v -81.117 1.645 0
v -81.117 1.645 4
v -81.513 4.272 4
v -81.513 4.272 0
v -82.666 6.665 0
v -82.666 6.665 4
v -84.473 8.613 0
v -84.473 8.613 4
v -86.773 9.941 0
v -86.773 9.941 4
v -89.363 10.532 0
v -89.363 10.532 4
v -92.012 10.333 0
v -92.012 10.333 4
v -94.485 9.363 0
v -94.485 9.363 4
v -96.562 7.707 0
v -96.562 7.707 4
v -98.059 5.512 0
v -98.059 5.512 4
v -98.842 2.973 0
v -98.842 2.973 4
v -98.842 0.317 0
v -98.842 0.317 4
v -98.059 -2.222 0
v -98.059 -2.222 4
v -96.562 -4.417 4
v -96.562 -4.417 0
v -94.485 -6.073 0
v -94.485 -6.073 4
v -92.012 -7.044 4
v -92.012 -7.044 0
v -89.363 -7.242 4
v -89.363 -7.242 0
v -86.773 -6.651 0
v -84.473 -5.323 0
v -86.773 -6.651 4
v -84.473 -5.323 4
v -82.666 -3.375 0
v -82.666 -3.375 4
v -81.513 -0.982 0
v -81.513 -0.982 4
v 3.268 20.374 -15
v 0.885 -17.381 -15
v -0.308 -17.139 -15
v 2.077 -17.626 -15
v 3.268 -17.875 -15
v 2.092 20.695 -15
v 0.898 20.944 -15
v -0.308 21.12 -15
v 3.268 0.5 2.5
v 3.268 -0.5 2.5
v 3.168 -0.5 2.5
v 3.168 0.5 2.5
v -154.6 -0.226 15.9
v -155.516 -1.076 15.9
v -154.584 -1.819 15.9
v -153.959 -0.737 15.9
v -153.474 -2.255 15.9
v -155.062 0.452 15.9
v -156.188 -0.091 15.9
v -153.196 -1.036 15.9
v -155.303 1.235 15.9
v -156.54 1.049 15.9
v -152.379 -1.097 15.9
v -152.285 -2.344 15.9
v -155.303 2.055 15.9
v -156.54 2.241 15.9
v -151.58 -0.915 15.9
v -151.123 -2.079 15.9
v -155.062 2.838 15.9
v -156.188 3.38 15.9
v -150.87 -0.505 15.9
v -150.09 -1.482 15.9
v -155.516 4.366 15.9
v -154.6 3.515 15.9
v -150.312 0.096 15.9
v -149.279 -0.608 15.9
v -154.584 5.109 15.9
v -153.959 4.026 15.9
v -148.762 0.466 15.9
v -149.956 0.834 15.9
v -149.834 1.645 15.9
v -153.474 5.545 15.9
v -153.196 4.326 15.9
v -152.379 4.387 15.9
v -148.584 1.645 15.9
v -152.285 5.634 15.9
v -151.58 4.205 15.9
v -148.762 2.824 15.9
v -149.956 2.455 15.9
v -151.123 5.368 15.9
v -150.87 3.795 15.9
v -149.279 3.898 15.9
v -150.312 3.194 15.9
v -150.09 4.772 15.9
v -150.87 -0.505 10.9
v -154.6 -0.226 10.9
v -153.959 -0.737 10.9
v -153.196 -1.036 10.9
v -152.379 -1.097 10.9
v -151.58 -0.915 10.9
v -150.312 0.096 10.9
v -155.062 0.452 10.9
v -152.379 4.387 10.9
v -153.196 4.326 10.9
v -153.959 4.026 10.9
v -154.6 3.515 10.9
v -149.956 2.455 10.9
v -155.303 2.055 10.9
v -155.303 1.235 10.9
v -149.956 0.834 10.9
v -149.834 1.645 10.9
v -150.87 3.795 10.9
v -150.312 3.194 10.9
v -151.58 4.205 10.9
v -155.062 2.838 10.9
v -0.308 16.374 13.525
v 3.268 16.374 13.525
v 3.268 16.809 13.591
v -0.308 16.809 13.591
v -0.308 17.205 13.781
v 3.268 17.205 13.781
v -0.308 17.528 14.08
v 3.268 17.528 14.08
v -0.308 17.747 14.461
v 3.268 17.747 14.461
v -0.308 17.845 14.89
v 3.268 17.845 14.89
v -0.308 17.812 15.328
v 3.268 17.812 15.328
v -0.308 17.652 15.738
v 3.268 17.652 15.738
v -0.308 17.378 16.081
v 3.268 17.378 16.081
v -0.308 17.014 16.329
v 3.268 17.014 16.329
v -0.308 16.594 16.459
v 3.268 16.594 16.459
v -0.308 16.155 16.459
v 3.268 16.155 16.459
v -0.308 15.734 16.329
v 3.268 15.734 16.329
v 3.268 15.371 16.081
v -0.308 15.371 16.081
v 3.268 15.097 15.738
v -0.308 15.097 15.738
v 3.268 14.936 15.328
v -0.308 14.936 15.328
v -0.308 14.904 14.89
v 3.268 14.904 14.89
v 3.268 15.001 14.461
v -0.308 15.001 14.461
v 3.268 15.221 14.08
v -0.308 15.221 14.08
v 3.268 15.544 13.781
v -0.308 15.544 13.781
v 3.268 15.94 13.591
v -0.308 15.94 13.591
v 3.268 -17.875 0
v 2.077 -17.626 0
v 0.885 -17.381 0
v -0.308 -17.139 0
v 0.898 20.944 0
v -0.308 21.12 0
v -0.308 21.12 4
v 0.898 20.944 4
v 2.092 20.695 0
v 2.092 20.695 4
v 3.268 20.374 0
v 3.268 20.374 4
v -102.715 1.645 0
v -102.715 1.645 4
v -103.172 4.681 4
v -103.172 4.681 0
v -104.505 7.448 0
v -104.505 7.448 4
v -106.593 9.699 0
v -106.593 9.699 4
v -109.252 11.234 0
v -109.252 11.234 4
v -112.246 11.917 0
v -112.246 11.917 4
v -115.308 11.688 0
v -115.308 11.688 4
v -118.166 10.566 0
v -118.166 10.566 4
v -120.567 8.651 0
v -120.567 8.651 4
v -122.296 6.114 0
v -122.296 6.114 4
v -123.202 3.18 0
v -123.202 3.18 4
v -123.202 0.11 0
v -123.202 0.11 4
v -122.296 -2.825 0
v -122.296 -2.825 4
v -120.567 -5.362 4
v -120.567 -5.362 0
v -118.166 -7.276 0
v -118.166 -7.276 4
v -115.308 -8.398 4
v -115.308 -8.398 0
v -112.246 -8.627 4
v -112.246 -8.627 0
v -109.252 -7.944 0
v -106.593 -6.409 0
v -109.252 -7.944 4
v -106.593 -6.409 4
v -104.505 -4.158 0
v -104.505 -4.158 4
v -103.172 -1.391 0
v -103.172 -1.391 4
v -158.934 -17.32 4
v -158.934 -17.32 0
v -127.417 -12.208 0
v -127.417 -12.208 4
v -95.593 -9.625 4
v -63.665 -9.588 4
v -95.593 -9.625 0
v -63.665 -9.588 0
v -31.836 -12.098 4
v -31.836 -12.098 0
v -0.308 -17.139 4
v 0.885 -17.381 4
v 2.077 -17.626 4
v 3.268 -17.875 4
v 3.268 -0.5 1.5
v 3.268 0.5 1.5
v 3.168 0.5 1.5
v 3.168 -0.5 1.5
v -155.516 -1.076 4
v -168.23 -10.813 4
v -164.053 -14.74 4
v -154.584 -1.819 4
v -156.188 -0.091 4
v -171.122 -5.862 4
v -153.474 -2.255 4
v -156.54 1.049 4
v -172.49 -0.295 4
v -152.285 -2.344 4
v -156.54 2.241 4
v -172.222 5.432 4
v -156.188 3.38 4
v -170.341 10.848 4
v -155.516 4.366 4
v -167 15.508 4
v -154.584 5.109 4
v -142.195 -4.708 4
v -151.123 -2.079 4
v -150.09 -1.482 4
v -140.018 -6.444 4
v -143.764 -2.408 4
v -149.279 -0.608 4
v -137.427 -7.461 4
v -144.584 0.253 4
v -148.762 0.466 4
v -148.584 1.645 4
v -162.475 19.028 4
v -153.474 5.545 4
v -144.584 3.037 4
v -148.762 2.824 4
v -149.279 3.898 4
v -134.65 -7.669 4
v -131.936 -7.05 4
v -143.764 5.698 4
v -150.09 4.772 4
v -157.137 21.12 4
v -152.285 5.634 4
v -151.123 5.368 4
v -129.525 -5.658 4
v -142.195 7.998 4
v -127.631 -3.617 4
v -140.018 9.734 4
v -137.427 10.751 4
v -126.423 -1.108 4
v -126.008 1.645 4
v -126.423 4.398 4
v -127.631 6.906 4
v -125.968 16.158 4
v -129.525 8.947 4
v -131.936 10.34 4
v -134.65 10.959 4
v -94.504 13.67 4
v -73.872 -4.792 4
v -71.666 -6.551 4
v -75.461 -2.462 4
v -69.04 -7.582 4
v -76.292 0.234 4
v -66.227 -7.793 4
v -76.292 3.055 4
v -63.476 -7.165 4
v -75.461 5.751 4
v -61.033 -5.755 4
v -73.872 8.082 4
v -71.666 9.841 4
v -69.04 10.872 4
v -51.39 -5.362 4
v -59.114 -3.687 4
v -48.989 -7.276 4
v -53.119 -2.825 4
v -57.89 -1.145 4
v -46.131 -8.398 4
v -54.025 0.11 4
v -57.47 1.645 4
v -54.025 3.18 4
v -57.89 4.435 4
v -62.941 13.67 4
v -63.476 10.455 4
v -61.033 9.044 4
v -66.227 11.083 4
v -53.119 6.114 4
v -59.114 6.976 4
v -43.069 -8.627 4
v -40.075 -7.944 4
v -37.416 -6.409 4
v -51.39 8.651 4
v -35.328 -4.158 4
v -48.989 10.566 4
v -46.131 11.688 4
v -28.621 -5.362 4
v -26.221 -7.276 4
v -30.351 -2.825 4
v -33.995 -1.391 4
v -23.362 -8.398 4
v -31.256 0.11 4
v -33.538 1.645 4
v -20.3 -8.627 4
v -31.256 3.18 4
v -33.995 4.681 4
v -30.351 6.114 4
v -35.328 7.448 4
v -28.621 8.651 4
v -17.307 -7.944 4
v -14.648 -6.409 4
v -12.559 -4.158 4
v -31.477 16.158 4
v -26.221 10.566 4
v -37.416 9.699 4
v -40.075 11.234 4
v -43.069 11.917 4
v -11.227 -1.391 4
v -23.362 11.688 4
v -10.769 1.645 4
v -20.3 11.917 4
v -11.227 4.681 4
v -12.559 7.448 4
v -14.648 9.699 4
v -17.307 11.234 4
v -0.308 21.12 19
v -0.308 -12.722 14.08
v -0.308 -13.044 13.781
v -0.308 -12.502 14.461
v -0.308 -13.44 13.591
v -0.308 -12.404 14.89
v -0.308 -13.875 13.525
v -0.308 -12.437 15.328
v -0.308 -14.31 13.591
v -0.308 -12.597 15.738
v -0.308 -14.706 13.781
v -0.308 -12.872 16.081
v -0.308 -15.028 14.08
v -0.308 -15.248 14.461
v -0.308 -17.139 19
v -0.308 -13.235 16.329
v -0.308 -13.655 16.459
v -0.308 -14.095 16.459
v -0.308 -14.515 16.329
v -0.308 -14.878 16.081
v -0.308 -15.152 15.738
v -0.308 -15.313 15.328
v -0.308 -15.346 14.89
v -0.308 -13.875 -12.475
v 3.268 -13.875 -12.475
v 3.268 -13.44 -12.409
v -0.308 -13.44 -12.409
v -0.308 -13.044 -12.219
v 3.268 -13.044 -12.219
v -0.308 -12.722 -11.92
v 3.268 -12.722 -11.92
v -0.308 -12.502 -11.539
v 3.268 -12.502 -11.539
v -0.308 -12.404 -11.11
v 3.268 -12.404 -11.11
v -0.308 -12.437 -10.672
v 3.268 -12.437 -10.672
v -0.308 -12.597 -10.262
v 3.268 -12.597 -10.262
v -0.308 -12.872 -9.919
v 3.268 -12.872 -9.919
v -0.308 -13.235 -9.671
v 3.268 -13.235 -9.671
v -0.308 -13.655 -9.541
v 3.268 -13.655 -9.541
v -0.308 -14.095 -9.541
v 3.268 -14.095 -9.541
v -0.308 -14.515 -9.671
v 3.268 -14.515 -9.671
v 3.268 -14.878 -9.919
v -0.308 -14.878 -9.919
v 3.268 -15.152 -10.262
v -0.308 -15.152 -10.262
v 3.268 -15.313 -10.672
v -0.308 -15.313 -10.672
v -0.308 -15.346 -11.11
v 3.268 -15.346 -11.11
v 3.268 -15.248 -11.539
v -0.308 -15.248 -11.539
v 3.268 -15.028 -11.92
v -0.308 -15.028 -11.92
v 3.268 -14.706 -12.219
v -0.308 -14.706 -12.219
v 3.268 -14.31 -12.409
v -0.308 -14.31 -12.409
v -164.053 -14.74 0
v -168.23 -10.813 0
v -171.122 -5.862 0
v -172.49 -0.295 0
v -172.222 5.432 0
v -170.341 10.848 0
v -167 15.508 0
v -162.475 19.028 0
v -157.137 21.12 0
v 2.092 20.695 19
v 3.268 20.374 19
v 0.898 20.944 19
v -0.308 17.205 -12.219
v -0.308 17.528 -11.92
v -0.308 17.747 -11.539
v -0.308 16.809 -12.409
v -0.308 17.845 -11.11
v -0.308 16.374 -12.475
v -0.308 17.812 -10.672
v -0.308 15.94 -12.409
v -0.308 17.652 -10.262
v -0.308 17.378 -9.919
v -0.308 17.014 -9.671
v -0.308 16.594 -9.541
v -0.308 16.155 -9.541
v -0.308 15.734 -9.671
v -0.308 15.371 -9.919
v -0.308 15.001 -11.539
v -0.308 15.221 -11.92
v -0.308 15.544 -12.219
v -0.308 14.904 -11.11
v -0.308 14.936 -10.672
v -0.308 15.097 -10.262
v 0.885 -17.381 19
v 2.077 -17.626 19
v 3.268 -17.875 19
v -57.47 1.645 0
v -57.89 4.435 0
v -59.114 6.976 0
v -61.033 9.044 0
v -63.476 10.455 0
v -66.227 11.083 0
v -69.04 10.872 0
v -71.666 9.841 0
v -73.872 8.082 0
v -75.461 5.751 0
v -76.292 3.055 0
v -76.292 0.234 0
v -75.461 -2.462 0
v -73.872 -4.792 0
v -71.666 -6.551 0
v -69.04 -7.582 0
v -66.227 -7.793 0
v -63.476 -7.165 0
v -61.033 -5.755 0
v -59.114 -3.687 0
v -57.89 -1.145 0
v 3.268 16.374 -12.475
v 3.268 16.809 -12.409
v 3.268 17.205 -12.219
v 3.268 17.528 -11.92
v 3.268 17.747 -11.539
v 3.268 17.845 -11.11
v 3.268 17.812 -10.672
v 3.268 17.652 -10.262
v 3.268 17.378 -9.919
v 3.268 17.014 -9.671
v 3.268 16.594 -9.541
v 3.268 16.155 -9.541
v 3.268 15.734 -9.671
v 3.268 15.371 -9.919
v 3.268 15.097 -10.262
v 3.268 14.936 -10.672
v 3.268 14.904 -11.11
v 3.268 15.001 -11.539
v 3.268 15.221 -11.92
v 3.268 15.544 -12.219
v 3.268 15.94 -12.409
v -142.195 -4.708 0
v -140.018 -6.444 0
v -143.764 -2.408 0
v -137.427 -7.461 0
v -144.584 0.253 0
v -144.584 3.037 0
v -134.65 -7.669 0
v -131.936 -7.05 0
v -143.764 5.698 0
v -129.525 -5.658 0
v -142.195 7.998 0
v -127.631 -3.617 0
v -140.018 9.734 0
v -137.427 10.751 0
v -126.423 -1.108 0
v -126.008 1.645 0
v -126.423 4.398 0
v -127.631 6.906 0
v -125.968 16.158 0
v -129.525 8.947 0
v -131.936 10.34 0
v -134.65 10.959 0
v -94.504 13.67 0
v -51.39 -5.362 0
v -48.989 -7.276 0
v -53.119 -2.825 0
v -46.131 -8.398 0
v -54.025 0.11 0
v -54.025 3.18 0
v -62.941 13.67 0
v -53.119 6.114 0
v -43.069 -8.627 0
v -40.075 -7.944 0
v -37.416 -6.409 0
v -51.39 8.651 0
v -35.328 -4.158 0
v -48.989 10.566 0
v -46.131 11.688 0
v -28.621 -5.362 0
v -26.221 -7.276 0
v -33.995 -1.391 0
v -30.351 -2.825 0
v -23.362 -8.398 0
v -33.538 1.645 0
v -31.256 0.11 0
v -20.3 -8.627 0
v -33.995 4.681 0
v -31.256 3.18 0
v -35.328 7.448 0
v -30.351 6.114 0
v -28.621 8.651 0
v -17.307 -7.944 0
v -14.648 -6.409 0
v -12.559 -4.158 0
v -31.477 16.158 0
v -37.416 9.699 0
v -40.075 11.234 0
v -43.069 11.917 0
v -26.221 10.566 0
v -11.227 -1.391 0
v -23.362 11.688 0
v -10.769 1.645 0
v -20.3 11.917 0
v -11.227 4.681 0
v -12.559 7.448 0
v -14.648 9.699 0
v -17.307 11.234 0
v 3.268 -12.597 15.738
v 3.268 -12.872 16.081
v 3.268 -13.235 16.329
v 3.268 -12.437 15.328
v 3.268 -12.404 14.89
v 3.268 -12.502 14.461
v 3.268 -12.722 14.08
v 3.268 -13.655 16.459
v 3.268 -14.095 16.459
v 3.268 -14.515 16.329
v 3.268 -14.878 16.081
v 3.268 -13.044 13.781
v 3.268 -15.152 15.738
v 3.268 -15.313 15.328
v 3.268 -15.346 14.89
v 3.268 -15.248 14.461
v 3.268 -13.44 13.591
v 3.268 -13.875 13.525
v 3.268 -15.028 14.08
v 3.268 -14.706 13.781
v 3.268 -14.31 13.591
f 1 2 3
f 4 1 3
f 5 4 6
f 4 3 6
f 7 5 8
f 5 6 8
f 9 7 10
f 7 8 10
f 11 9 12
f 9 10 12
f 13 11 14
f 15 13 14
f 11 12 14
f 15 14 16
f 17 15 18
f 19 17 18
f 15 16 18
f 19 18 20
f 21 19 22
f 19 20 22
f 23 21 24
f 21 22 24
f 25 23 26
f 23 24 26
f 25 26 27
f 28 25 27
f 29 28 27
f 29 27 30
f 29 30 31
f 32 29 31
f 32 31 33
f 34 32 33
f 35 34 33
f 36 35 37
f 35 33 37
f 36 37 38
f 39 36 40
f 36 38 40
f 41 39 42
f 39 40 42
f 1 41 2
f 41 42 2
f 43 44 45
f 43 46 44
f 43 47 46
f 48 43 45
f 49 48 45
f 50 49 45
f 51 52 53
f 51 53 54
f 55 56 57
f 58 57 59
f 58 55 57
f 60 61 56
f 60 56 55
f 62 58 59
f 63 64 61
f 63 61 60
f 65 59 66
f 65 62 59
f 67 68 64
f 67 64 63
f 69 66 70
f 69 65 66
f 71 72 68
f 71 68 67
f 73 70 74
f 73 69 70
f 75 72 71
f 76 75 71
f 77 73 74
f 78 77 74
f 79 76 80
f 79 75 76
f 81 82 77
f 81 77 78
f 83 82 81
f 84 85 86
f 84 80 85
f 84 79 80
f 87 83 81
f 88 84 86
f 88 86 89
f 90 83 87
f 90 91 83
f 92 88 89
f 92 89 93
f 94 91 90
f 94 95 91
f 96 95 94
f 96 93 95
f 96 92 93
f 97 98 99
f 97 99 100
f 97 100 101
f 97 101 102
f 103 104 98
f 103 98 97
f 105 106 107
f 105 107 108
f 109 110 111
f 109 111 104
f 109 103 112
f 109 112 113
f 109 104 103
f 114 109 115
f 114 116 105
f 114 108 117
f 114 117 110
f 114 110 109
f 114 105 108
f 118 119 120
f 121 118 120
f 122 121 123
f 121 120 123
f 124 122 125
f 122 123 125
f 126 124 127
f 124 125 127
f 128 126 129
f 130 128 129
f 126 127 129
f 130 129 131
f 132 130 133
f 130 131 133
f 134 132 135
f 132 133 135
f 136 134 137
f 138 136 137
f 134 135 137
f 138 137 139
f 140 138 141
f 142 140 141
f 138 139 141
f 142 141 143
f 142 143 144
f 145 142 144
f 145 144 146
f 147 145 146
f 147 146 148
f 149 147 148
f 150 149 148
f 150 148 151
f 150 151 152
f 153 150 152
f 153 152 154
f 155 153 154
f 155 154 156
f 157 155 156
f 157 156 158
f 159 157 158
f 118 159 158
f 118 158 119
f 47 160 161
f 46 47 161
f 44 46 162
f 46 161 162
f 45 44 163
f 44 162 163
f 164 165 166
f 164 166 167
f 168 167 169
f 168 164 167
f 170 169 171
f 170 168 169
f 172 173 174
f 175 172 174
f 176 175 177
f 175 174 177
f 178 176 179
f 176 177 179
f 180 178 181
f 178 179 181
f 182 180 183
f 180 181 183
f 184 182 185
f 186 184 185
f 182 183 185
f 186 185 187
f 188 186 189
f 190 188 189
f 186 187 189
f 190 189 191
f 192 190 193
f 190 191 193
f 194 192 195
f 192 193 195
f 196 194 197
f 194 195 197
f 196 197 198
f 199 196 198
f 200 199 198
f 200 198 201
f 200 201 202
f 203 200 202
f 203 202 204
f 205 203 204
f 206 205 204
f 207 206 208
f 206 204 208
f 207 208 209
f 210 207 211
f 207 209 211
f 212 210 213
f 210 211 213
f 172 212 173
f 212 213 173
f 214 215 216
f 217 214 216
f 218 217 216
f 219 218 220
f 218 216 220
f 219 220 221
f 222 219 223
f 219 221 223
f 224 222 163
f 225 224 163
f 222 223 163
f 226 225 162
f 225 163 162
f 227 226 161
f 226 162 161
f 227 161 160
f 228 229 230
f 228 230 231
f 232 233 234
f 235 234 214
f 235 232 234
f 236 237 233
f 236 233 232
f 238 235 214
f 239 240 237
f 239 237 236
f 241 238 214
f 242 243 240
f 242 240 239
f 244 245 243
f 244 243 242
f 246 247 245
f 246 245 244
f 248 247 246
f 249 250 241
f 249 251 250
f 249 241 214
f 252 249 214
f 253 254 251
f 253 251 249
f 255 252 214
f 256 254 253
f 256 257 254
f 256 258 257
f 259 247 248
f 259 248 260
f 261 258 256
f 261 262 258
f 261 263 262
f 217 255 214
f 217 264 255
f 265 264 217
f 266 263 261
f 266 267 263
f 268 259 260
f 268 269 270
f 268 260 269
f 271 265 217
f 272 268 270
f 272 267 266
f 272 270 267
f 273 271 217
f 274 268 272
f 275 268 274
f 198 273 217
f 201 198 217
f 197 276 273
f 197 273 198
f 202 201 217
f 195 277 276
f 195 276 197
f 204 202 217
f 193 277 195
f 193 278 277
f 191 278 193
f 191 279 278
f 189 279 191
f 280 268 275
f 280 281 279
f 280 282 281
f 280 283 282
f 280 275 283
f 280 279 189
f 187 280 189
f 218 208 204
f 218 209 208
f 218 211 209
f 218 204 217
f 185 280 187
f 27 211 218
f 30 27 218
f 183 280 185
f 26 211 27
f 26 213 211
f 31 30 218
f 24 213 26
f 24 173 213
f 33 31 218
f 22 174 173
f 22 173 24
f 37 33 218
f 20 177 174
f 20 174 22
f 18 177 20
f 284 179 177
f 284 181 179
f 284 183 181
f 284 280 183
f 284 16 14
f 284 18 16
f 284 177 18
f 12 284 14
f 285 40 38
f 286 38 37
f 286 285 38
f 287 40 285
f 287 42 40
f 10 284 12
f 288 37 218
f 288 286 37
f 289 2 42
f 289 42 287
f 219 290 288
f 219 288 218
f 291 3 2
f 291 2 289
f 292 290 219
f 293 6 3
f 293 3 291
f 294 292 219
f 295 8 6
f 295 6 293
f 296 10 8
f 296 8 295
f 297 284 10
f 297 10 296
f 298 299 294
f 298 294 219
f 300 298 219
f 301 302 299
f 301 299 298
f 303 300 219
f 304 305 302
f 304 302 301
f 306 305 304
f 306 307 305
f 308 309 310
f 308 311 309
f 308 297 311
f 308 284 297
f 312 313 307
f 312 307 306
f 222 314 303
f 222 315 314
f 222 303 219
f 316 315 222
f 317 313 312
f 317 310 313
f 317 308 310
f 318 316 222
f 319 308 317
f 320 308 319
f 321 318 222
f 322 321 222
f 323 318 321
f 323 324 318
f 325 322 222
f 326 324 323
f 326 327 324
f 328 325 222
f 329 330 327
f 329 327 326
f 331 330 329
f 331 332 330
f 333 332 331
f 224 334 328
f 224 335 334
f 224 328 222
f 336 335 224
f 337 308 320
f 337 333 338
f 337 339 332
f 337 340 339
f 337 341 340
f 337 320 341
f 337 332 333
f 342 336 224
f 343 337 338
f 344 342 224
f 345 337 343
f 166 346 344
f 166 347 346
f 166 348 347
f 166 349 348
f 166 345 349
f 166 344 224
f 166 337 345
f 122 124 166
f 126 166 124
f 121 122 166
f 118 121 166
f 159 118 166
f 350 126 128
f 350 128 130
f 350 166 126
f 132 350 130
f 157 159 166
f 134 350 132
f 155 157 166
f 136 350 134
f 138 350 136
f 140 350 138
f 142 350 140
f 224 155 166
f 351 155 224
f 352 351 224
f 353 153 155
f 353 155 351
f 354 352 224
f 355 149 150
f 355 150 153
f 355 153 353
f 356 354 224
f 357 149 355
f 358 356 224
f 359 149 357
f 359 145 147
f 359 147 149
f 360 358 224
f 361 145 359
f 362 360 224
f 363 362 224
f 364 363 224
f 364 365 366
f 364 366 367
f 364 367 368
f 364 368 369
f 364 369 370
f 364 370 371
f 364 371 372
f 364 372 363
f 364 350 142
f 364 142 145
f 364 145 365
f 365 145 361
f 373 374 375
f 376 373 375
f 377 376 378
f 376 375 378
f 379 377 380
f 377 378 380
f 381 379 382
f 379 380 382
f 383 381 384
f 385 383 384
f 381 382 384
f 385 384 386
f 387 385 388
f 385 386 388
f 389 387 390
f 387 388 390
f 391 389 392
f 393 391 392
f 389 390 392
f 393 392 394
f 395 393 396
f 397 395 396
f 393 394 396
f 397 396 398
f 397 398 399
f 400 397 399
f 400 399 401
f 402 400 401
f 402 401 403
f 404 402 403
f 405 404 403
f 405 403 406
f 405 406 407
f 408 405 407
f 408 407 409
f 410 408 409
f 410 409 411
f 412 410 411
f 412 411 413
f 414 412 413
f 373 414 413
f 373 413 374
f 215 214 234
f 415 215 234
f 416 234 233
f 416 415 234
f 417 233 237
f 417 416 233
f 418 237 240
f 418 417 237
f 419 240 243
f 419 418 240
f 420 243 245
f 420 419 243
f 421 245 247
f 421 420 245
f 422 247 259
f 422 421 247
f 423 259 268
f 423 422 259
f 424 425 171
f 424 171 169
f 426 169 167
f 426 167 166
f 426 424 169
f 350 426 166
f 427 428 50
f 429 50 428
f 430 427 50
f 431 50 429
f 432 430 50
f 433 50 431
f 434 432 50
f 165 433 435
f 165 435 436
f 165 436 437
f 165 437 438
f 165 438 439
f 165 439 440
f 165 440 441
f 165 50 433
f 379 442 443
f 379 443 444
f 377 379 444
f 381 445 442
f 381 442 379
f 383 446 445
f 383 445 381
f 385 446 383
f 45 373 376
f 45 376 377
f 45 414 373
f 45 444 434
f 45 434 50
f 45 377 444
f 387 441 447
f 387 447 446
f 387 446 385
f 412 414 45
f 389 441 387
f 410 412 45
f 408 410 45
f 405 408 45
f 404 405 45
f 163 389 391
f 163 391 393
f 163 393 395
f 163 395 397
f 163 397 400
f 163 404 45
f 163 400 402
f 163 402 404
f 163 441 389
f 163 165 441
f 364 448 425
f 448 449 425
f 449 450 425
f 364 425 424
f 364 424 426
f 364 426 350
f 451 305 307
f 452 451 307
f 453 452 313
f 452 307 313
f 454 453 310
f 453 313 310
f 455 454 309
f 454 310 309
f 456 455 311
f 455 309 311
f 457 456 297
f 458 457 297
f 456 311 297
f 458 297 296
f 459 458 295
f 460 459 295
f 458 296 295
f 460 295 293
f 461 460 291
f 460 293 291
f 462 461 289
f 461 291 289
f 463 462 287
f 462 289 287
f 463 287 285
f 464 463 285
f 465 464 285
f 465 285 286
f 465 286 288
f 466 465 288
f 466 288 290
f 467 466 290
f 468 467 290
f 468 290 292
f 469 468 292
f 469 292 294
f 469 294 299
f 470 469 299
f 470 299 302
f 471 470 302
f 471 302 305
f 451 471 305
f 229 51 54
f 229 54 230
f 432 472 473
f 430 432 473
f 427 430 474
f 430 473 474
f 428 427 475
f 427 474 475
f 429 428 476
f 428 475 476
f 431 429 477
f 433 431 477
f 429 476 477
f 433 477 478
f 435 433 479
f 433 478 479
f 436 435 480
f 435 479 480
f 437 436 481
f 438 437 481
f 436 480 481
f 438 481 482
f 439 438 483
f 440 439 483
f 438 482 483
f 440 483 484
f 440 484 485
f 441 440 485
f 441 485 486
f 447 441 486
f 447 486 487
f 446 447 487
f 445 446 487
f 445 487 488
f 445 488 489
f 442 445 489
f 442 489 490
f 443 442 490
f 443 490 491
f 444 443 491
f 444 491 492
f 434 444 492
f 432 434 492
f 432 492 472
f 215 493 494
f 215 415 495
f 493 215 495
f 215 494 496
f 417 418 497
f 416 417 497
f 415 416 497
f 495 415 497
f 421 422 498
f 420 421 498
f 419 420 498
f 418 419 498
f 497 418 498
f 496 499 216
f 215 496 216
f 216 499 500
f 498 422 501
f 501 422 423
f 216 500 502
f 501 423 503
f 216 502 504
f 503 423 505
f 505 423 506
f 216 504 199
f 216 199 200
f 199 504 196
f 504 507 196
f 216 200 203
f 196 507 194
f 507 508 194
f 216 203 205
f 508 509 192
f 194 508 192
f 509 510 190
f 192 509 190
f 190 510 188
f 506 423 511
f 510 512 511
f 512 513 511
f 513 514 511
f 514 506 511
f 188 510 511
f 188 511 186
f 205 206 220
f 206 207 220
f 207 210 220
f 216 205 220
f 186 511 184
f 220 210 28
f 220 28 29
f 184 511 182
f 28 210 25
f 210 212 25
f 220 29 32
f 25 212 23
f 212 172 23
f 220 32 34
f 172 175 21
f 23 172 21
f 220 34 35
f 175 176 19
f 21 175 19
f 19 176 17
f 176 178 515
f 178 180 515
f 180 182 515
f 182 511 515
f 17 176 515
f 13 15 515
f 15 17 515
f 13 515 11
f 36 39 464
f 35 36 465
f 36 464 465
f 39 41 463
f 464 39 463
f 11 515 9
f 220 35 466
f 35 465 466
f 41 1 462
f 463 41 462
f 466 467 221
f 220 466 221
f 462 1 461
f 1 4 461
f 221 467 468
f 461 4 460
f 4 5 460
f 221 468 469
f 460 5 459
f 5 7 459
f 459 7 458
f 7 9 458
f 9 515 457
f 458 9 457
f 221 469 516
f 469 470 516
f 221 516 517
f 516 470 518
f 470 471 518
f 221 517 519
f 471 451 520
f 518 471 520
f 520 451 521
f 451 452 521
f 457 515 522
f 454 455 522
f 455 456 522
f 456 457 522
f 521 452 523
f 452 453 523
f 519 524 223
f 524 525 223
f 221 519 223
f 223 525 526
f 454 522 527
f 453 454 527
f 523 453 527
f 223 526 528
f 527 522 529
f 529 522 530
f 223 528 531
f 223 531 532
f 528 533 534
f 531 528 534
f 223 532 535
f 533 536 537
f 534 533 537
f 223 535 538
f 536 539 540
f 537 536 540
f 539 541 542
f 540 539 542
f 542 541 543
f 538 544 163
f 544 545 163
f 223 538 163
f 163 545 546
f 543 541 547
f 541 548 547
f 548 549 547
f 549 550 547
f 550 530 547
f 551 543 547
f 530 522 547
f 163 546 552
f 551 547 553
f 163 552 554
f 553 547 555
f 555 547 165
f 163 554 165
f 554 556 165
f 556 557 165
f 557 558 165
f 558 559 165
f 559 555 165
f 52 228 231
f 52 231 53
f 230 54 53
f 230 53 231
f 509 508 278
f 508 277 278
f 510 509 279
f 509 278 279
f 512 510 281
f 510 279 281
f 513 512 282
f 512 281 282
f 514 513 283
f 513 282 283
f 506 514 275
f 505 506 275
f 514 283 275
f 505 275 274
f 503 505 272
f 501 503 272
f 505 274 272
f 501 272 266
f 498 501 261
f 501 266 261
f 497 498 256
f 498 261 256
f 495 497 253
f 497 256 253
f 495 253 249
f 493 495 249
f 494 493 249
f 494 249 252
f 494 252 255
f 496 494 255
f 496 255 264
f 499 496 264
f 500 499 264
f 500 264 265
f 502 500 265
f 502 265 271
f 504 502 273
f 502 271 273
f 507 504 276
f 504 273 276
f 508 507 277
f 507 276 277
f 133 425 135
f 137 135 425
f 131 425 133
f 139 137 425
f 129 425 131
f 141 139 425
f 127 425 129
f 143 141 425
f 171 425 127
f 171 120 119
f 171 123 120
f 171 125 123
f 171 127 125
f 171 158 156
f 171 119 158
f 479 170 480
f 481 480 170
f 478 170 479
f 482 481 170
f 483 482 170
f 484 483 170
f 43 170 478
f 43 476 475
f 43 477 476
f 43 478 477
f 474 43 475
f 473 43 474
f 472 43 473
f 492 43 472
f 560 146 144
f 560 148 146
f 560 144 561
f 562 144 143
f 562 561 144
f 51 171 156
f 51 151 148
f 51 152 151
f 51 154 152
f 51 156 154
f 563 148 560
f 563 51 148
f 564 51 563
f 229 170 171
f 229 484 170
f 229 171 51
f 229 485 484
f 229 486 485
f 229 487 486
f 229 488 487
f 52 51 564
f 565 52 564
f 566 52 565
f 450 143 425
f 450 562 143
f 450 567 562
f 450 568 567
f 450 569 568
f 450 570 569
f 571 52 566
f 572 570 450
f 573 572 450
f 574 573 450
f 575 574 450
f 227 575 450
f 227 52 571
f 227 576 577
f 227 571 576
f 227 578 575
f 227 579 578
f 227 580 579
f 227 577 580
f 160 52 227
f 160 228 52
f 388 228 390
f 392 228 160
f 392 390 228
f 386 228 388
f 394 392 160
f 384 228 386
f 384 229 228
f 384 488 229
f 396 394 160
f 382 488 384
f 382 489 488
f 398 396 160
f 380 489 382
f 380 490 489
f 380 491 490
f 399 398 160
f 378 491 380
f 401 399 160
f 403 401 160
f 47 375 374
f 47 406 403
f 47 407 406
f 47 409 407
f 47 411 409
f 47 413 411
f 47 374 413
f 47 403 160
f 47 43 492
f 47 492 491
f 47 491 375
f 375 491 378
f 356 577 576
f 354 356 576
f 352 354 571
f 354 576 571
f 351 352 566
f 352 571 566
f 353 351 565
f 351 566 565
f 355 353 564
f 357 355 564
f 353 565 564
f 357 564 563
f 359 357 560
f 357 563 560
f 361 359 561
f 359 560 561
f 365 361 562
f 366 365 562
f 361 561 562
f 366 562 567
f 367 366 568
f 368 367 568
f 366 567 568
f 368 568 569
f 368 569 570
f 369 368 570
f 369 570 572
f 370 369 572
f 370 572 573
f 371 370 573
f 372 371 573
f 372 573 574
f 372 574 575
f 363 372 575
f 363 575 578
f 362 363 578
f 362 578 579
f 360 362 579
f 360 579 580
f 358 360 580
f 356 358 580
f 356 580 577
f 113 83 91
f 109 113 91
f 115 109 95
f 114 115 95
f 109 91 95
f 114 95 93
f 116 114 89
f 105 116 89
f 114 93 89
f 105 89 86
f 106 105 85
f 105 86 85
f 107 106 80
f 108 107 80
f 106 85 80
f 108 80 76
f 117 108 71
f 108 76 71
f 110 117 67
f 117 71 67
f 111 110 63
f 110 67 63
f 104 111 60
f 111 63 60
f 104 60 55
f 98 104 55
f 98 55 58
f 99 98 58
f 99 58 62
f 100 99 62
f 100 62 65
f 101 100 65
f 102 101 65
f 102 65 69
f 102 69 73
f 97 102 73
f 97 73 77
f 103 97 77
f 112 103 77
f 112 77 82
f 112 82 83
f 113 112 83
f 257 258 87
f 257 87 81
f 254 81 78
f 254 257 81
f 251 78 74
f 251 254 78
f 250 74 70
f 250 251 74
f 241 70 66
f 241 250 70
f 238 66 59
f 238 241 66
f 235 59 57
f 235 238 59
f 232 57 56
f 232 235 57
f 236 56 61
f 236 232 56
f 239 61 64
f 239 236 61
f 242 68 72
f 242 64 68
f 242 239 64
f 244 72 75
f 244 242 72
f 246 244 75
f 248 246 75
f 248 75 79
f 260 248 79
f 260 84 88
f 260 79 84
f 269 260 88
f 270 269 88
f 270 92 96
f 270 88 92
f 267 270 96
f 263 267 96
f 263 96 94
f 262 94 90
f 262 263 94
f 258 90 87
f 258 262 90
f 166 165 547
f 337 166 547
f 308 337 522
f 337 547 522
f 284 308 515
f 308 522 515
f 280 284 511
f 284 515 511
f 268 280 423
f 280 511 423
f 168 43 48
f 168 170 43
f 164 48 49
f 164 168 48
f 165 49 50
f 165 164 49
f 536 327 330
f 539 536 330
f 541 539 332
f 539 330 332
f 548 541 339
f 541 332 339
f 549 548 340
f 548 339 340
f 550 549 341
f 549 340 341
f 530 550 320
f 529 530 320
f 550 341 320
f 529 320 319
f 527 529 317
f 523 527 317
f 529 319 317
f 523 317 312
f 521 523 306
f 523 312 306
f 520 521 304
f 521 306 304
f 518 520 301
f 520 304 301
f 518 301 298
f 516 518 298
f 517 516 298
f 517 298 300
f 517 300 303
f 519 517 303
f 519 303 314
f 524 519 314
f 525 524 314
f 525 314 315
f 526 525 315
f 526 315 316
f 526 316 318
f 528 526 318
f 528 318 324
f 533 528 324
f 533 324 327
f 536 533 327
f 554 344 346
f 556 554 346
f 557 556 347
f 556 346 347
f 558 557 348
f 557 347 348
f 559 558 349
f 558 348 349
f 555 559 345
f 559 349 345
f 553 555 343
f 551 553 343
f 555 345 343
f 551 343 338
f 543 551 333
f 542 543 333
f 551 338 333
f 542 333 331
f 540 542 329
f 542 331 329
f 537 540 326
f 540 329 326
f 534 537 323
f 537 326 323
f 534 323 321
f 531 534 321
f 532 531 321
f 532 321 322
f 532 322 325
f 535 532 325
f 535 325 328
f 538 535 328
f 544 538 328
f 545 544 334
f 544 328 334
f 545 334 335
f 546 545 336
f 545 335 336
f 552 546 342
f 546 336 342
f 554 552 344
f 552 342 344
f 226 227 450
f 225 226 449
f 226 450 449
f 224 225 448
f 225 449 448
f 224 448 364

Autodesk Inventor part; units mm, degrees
ref_plane "YZ Plane" through (0, 0, 0) normal (1, 0, 0) x (0, 1, 0)
ref_plane "XZ Plane" through (0, 0, 0) normal (0, 1, 0) x (-1, 0, 0)
ref_plane "XY Plane" through (0, 0, 0) normal (0, 0, 1) x (1, 0, 0)
sketch "Sketch1" plane through (0, 0, 0) normal (0, 0, 1) x (1, 0, 0)
  circle A0 centre (-152.5842, 1.6449) radius 20
  circle A1 centre (-2.5848, 1.2498) radius 20
  arc A2 (-157.1373, 21.1198) -> (-0.3077, 21.1198) centre (-78.7225, 413.3584) ccw
  arc A3 (3.2676, -17.8748) -> (-158.9335, -17.3205) centre (-79.1716, -409.2873) ccw
  dimension "d5" = 40
  dimension "d6" = 40
  dimension "d7" = 150
  dimension "d8" = 400
  dimension "d9" = 400
extrude "Extrusion1" add sketch "Sketch1" along normal blind 4 contours A2 A0 A3 | A2 A1 A3 A0 | A2 A1 A3
sketch "Sketch2" plane through (0, 0, 4) normal (0, 0, 1) x (1, 0, 0)
  arc A0 (-157.1373, 21.1198) -> (-158.9335, -17.3205) centre (-152.5842, 1.6449) ccw projected
  circle A1 centre (-152.5842, 1.6449) radius 4
  point P0 (0, 0)
  dimension "d12" = 8
extrude "Extrusion2" add sketch "Sketch2" along normal blind 11.9
sketch "Sketch3" plane through (-152.5842, 1.6449, 15.9) normal (0, 0, 1) x (1, 0, 0)
  circle A0 centre (0, 0) radius 2.75
  point P0 (152.5842, -1.6449)
  dimension "d16" = 5.5
extrude "Extrusion3" cut sketch "Sketch3" against normal blind 5
sketch "Sketch4" plane through (0, 0, 0) normal (0, 0, -1) x (-1, 0, 0)
  arc A0 (0.3077, 21.1198) -> (-3.2676, -17.8748) centre (2.5848, 1.2498) ccw projected
  line L0 (0.3077, 21.1198) -> (0.3077, -17.1388)
  arc A1 (158.9335, -17.3205) -> (-3.2676, -17.8748) centre (79.1716, -409.2873) ccw projected
  point P0 (0, 0)
extrude "Extrusion4" add sketch "Sketch4" along normal blind 15 and the other way blind 19
sketch "Sketch5" plane through (0, 0, -15) normal (0, 0, -1) x (-1, 0, 0)
  arc A0 (0.3077, 21.1198) -> (-3.2676, -17.8748) centre (2.5848, 1.2498) ccw projected
  line L0 (-3.2676, 20.3744) -> (-3.2676, -17.8748)
  point P0 (0, 0)
extrude "Extrusion5" cut sketch "Sketch5" against normal blind 35
sketch "Sketch6" plane through (-152.5842, 1.6449, 15.9) normal (0, 0, 1) x (1, 0, 0)
  point P0 (152.5842, -1.6449)
sketch "Sketch7" plane through (-0.3077, -17.1388, 4) normal (-1, 0, 0) x (0, 0, 1)
  point P0 (-4, 17.1388)
sketch "Sketch8" plane through (-0.3077, -17.1388, 4) normal (-1, 0, 0) x (0, 0, 1)
  point P0 (-4, 17.1388)
sketch "Sketch9" plane through (3.2676, -17.8748, -15) normal (1, 0, 0) x (0, 0, -1)
  circle A0 centre (-4, 4) radius 1.475
  circle A1 centre (-4, 34.2492) radius 1.475
  circle A2 centre (-30, 4) radius 1.475
  circle A3 centre (-30, 34.2492) radius 1.475
  line L0 (0, 38.2492) -> (0, 0) projected
  line L1 (-34, 0) -> (-34, 38.2492) projected
  line L2 (0, 0) -> (-34, 0) projected
  line L3 (-34, 38.2492) -> (0, 38.2492) projected
  point P0 (-15, 17.8748)
  dimension "d27" = 2.95
  dimension "d28" = 2.95
  dimension "d29" = 2.95
  dimension "d30" = 2.95
  dimension "d31" = 4
  dimension "d32" = 4
  dimension "d33" = 4
  dimension "d34" = 4
  dimension "d35" = 4
  dimension "d36" = 4
  dimension "d37" = 4
  dimension "d38" = 4
extrude "Extrusion6" cut sketch "Sketch9" against normal blind 5 contours A0 | A1 | A2 | A3
sketch "Sketch10" plane through (0, 0, 4) normal (0, 0, 1) x (1, 0, 0)
  point P0 (0, 0)
sketch "Sketch11" plane through (0, 0, 4) normal (0, 0, 1) x (1, 0, 0)
  point P0 (0, 0)
sketch "Sketch12" plane through (0, 0, 4) normal (0, 0, 1) x (1, 0, 0)
  point P0 (0, 0)
sketch "Sketch13" plane through (0, 0, 4) normal (0, 0, 1) x (1, 0, 0)
  circle A0 centre (-113.0156, 1.6449) radius 10.301
  circle A1 centre (-90.0292, 1.6449) radius 8.912
  circle A2 centre (-66.9339, 1.6449) radius 9.4643
  circle A3 centre (-43.8386, 1.6449) radius 10.301
  circle A4 centre (-21.0701, 1.6449) radius 10.301
  circle A5 centre (-135.3483, 1.6449) radius 9.3403
  point P0 (0, 0)
extrude "Extrusion7" cut sketch "Sketch13" against normal blind 10
sketch "Sketch14" plane through (3.2676, -17.8748, -15) normal (1, 0, 0) x (0, 0, -1)
  line L0 (-17.5, 18.3748) -> (-16.5, 18.3748)
  line L1 (-16.5, 18.3748) -> (-16.5, 17.3748)
  line L2 (-16.5, 17.3748) -> (-17.5, 17.3748)
  line L3 (-17.5, 17.3748) -> (-17.5, 18.3748)
  line L4 (-17.5, 18.3748) -> (-16.5, 17.3748) construction
  line L5 (-16.5, 18.3748) -> (-17.5, 17.3748) construction
  point P0 (-15, 17.8748)
  point P1 (-17, 17.8748)
  dimension "d43" = 1
  dimension "d44" = 1
extrude "Extrusion8" cut sketch "Sketch14" against normal blind 0.1
properties part number "arm" material "Aluminum 6061"
